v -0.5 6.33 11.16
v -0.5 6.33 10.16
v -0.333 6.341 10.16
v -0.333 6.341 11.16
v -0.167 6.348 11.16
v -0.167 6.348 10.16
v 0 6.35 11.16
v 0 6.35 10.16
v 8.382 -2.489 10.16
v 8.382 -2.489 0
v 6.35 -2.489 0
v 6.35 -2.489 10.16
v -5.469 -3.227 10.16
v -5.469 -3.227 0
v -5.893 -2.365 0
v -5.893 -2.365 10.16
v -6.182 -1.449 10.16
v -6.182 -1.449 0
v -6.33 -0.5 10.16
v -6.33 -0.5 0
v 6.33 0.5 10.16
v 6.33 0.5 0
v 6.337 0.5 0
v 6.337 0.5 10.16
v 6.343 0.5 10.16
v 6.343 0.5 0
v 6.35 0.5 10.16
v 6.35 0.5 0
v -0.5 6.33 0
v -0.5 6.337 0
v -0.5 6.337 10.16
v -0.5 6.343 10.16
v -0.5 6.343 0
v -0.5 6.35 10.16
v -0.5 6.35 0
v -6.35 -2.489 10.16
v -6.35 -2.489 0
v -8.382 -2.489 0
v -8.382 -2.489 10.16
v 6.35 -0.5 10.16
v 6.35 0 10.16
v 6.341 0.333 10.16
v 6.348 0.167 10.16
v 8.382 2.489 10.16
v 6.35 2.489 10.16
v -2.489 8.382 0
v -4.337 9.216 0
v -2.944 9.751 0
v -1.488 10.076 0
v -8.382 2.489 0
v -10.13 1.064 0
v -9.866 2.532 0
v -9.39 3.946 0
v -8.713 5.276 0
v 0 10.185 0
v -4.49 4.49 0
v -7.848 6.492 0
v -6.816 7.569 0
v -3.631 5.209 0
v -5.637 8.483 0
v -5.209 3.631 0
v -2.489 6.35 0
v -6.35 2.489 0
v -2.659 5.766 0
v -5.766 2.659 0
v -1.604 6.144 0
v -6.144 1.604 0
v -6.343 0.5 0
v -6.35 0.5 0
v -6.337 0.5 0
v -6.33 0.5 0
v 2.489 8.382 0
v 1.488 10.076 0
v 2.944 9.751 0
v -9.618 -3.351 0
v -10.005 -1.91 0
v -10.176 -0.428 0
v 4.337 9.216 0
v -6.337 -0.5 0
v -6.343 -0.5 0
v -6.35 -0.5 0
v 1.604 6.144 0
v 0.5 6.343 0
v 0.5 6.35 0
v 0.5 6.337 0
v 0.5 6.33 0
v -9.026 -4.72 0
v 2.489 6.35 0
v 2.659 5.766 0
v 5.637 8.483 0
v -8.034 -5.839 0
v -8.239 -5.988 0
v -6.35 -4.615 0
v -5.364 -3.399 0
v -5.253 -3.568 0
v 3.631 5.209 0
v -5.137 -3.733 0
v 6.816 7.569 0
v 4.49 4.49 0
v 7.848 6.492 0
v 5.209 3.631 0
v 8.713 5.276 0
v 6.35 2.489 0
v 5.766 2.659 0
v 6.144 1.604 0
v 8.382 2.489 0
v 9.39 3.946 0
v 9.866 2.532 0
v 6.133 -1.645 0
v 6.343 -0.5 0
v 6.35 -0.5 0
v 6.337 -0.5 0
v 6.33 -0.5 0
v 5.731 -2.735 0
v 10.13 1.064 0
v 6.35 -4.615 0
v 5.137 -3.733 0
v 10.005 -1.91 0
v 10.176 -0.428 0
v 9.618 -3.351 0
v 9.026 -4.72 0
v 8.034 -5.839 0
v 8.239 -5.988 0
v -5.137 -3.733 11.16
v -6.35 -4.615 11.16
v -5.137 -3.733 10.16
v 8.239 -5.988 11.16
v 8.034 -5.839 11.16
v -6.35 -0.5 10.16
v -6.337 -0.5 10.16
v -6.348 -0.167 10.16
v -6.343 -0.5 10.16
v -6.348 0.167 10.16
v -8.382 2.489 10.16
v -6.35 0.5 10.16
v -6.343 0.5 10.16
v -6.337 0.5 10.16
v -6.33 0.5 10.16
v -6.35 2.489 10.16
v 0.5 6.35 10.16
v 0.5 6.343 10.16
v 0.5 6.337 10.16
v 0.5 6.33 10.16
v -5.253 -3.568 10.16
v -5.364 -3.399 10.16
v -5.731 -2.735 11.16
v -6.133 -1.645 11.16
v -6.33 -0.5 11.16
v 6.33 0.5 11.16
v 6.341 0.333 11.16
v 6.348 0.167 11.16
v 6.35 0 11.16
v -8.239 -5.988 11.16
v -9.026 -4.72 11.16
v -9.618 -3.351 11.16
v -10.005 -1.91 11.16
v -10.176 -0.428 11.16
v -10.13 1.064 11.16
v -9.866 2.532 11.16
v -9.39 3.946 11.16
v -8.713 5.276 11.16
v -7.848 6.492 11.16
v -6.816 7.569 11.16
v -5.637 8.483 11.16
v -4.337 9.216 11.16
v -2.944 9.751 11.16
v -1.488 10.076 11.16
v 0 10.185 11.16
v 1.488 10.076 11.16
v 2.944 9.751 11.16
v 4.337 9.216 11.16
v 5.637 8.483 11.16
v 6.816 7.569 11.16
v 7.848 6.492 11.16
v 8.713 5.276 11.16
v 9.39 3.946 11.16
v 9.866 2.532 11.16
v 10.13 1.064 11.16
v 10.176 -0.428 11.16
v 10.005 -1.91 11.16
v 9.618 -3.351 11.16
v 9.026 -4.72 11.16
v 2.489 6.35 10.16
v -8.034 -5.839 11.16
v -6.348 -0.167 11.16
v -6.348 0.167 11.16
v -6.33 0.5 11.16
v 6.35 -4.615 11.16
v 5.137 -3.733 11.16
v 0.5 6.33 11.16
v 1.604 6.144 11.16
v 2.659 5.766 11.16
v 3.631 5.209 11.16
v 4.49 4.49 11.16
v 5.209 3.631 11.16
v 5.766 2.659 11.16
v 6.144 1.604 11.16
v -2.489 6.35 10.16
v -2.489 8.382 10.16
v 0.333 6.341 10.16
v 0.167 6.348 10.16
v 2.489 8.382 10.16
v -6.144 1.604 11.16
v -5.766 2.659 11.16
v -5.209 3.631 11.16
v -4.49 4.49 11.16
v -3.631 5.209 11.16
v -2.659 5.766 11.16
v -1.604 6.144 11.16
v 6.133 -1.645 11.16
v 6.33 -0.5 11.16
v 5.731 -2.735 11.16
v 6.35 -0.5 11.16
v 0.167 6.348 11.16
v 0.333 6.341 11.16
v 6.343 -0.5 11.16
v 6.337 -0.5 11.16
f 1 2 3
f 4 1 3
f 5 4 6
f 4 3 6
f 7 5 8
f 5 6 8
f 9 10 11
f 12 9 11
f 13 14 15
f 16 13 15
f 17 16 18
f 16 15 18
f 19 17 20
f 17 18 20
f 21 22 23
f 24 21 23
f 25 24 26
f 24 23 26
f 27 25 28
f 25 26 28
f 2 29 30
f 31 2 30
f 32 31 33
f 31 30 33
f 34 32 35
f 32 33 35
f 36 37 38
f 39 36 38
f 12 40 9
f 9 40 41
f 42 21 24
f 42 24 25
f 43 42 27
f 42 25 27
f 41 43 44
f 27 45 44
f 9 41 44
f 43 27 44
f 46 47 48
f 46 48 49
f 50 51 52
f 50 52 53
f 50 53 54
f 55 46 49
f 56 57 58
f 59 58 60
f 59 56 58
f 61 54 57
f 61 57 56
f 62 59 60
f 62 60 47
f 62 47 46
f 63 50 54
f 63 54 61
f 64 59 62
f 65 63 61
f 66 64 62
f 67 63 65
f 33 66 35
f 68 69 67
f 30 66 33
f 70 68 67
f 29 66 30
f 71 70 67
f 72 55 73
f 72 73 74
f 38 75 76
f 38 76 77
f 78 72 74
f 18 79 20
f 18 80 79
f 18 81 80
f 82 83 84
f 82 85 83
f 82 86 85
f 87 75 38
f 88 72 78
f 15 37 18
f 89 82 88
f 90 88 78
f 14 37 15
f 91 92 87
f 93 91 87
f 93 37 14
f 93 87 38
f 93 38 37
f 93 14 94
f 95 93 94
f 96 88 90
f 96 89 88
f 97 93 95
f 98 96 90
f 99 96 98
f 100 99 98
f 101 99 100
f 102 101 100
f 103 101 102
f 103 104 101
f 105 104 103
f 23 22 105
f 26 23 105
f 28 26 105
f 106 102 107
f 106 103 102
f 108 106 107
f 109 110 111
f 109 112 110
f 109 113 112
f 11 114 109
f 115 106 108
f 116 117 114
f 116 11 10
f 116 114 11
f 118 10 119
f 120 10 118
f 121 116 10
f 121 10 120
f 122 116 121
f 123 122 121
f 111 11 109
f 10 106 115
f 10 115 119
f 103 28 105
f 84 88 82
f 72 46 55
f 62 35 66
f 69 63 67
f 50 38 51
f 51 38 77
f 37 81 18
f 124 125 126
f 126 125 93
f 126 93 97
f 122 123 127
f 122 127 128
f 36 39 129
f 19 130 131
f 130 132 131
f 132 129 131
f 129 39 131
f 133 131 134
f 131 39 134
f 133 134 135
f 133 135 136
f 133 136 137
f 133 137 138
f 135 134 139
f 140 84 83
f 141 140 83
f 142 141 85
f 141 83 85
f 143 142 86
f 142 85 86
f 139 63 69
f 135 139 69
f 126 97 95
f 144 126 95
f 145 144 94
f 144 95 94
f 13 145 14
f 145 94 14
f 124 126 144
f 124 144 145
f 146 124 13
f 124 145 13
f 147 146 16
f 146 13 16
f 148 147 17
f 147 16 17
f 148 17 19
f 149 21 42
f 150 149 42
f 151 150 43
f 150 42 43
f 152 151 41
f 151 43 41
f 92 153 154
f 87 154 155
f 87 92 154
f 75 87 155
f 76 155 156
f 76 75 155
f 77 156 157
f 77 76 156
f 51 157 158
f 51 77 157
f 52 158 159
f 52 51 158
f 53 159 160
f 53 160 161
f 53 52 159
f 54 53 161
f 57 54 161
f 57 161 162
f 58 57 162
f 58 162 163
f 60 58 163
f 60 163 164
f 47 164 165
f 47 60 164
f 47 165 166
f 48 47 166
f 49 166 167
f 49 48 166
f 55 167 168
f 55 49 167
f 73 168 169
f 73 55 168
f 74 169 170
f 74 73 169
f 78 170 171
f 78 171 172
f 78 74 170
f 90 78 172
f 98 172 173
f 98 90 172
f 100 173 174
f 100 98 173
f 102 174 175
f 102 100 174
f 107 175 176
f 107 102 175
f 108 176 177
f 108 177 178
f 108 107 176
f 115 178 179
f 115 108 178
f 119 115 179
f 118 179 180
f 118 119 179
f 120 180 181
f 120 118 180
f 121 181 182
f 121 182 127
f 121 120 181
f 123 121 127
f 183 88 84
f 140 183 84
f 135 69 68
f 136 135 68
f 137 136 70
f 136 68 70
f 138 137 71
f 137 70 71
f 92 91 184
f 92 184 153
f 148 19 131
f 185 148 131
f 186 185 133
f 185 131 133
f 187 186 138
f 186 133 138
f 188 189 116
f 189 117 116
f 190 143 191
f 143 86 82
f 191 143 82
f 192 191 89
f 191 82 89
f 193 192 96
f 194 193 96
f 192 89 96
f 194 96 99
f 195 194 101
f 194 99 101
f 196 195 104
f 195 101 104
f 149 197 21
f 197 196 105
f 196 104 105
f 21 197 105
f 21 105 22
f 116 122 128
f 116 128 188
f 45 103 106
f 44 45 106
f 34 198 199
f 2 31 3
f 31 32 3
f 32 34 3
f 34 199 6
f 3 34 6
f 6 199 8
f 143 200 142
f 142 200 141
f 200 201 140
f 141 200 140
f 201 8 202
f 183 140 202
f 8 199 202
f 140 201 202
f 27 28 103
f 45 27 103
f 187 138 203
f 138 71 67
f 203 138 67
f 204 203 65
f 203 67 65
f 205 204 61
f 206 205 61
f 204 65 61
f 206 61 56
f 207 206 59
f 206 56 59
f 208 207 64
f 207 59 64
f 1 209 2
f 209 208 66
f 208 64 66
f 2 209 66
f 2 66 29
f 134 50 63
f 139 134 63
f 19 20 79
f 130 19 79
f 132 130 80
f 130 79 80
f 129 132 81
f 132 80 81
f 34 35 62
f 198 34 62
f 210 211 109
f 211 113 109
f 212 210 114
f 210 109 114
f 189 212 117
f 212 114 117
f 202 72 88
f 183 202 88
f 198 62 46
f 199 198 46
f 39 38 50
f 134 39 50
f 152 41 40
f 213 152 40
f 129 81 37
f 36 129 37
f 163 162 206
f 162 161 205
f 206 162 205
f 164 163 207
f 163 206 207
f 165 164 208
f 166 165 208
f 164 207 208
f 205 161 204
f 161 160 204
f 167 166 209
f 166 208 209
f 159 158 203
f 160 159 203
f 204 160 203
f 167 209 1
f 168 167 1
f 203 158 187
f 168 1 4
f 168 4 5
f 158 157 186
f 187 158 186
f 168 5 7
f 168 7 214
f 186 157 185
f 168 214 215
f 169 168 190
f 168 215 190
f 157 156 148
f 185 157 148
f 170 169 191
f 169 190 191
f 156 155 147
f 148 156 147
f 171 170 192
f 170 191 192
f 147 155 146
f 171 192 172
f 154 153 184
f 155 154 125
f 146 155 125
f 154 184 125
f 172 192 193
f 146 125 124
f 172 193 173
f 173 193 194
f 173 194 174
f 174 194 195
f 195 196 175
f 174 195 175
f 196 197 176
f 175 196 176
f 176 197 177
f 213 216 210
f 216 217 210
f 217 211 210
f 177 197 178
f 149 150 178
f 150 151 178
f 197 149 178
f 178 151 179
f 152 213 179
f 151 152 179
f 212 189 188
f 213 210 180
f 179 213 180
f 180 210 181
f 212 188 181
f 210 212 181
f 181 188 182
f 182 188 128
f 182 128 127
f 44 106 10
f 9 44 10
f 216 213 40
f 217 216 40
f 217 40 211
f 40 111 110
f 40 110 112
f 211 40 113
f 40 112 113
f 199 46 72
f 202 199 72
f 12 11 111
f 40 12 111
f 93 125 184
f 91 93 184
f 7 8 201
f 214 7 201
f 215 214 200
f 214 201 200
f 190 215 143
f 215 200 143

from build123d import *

# Parameters (mm, degrees)
F1_DEPTH = 10.16
F2_R     = 3
F4_DEPTH = 1
F6_DEPTH = 11.16
F8_DEPTH = 11.16


with BuildPart() as f1:
    # F0 (on Top) → F1 (new body)
    with BuildSketch(Plane.XY):
        with BuildLine():
            Line((2.4892, 8.382), (2.4892, 6.35))
            Line((2.4892, 6.35), (0.5, 6.35))
            ThreePointArc((0.5, 6.35), (0.4999030778, 6.340155572), (0.499612349, 6.3303149606))
            ThreePointArc((0.499612349, 6.3303149606), (4.4901280605, 4.4901280605), (6.3303149606, 0.499612349))
            ThreePointArc((6.3303149606, 0.499612349), (6.340155572, 0.4999030778), (6.35, 0.5))
            Line((6.35, 0.5), (6.35, 2.4892))
            Line((6.35, 2.4892), (8.382, 2.4892))
            Line((8.382, 2.4892), (8.382, -2.4892))
            Line((8.382, -2.4892), (6.35, -2.4892))
            Line((6.35, -2.4892), (6.35, -0.5))
            ThreePointArc((6.35, -0.5), (6.340155572, -0.4999030778), (6.3303149606, -0.499612349))
            ThreePointArc((6.3303149606, -0.499612349), (5.9570857831, -2.1990063604), (5.1366242038, -3.733308424))
            Line((5.1366242038, -3.733308424), (6.35, -4.6151923037))
            ThreePointArc((6.35, -4.6151923037), (6.5628814967, -4.3070972197), (6.760827121, -3.9892))
            Line((6.760827121, -3.9892), (9.882, -3.9892))
            Line((9.882, -3.9892), (9.882, 3.9892))
            Line((9.882, 3.9892), (6.760827121, 3.9892))
            ThreePointArc((6.760827121, 3.9892), (5.5507882323, 5.5507882323), (3.9892, 6.760827121))
            Line((3.9892, 6.760827121), (3.9892, 9.882))
            Line((3.9892, 9.882), (-3.9892, 9.882))
            Line((-3.9892, 9.882), (-3.9892, 6.760827121))
            ThreePointArc((-3.9892, 6.760827121), (-5.5507882323, 5.5507882323), (-6.760827121, 3.9892))
            Line((-6.760827121, 3.9892), (-9.882, 3.9892))
            Line((-9.882, 3.9892), (-9.882, -3.9892))
            Line((-9.882, -3.9892), (-6.760827121, -3.9892))
            ThreePointArc((-6.760827121, -3.9892), (-6.5628814967, -4.3070972197), (-6.35, -4.6151923037))
            Line((-6.35, -4.6151923037), (-5.1366242038, -3.733308424))
            ThreePointArc((-5.1366242038, -3.733308424), (-5.3088277076, -3.4840850121), (-5.4689493272, -3.2269324841))
            ThreePointArc((-5.4689493272, -3.2269324841), (-6.0551819306, -1.9123994841), (-6.3303149606, -0.499612349))
            ThreePointArc((-6.3303149606, -0.499612349), (-6.340155572, -0.4999030778), (-6.35, -0.5))
            Line((-6.35, -0.5), (-6.35, -2.4892))
            Line((-6.35, -2.4892), (-8.382, -2.4892))
            Line((-8.382, -2.4892), (-8.382, 2.4892))
            Line((-8.382, 2.4892), (-6.35, 2.4892))
            Line((-6.35, 2.4892), (-6.35, 0.5))
            ThreePointArc((-6.35, 0.5), (-6.340155572, 0.4999030778), (-6.3303149606, 0.499612349))
            ThreePointArc((-6.3303149606, 0.499612349), (-4.4901280605, 4.4901280605), (-0.499612349, 6.3303149606))
            ThreePointArc((-0.499612349, 6.3303149606), (-0.4999030778, 6.340155572), (-0.5, 6.35))
            Line((-0.5, 6.35), (-2.4892, 6.35))
            Line((-2.4892, 6.35), (-2.4892, 8.382))
            Line((-2.4892, 8.382), (2.4892, 8.382))
        make_face()
    extrude(amount=F1_DEPTH)

    # F2
    f2_edges = [f1.edges().sort_by_distance(p)[0] for p in [
        (-3.9892, 9.882, 5.08),
        (3.9892, 9.882, 5.08),
        (-9.882, 3.9892, 5.08),
        (-9.882, -3.9892, 5.08),
        (9.882, 3.9892, 5.08),
        (9.882, -3.9892, 5.08),
    ]]
    fillet(f2_edges, radius=F2_R)

    # F3 (on face) → F4 (join)
    with BuildSketch(Plane.XY.offset(10.16)):
        with BuildLine():
            ThreePointArc((-3.9892, 6.760827121), (-5.5507882323, 5.5507882323), (-6.760827121, 3.9892))
            Line((-6.760827121, 3.9892), (-6.882, 3.9892))
            ThreePointArc((-6.882, 3.9892), (-9.0033203436, 3.1105203436), (-9.882, 0.9892))
            Line((-9.882, 0.9892), (-9.882, -0.9892))
            ThreePointArc((-9.882, -0.9892), (-9.0033203436, -3.1105203436), (-6.882, -3.9892))
            Line((-6.882, -3.9892), (-6.760827121, -3.9892))
            ThreePointArc((-6.760827121, -3.9892), (-6.5628814967, -4.3070972197), (-6.35, -4.6151923037))
            Line((-6.35, -4.6151923037), (-5.1366242038, -3.733308424))
            ThreePointArc((-5.1366242038, -3.733308424), (-5.9570857831, -2.1990063604), (-6.3303149606, -0.499612349))
            ThreePointArc((-6.3303149606, -0.499612349), (-6.340155572, -0.4999030778), (-6.35, -0.5))
            Line((-6.35, -0.5), (-6.35, -2.4892))
            Line((-6.35, -2.4892), (-8.382, -2.4892))
            Line((-8.382, -2.4892), (-8.382, 2.4892))
            Line((-8.382, 2.4892), (-6.35, 2.4892))
            Line((-6.35, 2.4892), (-6.35, 0.5))
            ThreePointArc((-6.35, 0.5), (-6.340155572, 0.4999030778), (-6.3303149606, 0.499612349))
            ThreePointArc((-6.3303149606, 0.499612349), (-4.4901280605, 4.4901280605), (-0.499612349, 6.3303149606))
            ThreePointArc((-0.499612349, 6.3303149606), (-0.4999030778, 6.340155572), (-0.5, 6.35))
            Line((-0.5, 6.35), (-2.4892, 6.35))
            Line((-2.4892, 6.35), (-2.4892, 8.382))
            Line((-2.4892, 8.382), (2.4892, 8.382))
            Line((2.4892, 8.382), (2.4892, 6.35))
            Line((2.4892, 6.35), (0.5, 6.35))
            ThreePointArc((0.5, 6.35), (0.4999030778, 6.340155572), (0.499612349, 6.3303149606))
            ThreePointArc((0.499612349, 6.3303149606), (4.4901280605, 4.4901280605), (6.3303149606, 0.499612349))
            ThreePointArc((6.3303149606, 0.499612349), (6.340155572, 0.4999030778), (6.35, 0.5))
            Line((6.35, 0.5), (6.35, 2.4892))
            Line((6.35, 2.4892), (8.382, 2.4892))
            Line((8.382, 2.4892), (8.382, -2.4892))
            Line((8.382, -2.4892), (6.35, -2.4892))
            Line((6.35, -2.4892), (6.35, -0.5))
            ThreePointArc((6.35, -0.5), (6.340155572, -0.4999030778), (6.3303149606, -0.499612349))
            ThreePointArc((6.3303149606, -0.499612349), (5.9570857831, -2.1990063604), (5.1366242038, -3.733308424))
            Line((5.1366242038, -3.733308424), (6.35, -4.6151923037))
            ThreePointArc((6.35, -4.6151923037), (6.5628814967, -4.3070972197), (6.760827121, -3.9892))
            Line((6.760827121, -3.9892), (6.882, -3.9892))
            ThreePointArc((6.882, -3.9892), (9.0033203436, -3.1105203436), (9.882, -0.9892))
            Line((9.882, -0.9892), (9.882, 0.9892))
            ThreePointArc((9.882, 0.9892), (9.0033203436, 3.1105203436), (6.882, 3.9892))
            Line((6.882, 3.9892), (6.760827121, 3.9892))
            ThreePointArc((6.760827121, 3.9892), (5.5507882323, 5.5507882323), (3.9892, 6.760827121))
            Line((3.9892, 6.760827121), (3.9892, 6.882))
            ThreePointArc((3.9892, 6.882), (3.1105203436, 9.0033203436), (0.9892, 9.882))
            Line((0.9892, 9.882), (-0.9892, 9.882))
            ThreePointArc((-0.9892, 9.882), (-3.1105203436, 9.0033203436), (-3.9892, 6.882))
            Line((-3.9892, 6.882), (-3.9892, 6.760827121))
        make_face()
        with BuildLine():
            ThreePointArc((-6.35, -0.5), (-6.340155572, -0.4999030778), (-6.3303149606, -0.499612349))
            ThreePointArc((-6.3303149606, -0.499612349), (-6.35, 0), (-6.3303149606, 0.499612349))
            ThreePointArc((-6.3303149606, 0.499612349), (-6.340155572, 0.4999030778), (-6.35, 0.5))
            Line((-6.35, 0.5), (-6.35, 2.4892))
            Line((-6.35, 2.4892), (-8.382, 2.4892))
            Line((-8.382, 2.4892), (-8.382, -2.4892))
            Line((-8.382, -2.4892), (-6.35, -2.4892))
            Line((-6.35, -2.4892), (-6.35, -0.5))
        make_face()
        with BuildLine():
            ThreePointArc((-0.5, 6.35), (-0.4999030778, 6.340155572), (-0.499612349, 6.3303149606))
            ThreePointArc((-0.499612349, 6.3303149606), (-0.25, 6.3450768317), (0, 6.35))
            ThreePointArc((0, 6.35), (0.25, 6.3450768317), (0.499612349, 6.3303149606))
            ThreePointArc((0.499612349, 6.3303149606), (0.4999030778, 6.340155572), (0.5, 6.35))
            Line((0.5, 6.35), (2.4892, 6.35))
            Line((2.4892, 6.35), (2.4892, 8.382))
            Line((2.4892, 8.382), (-2.4892, 8.382))
            Line((-2.4892, 8.382), (-2.4892, 6.35))
            Line((-2.4892, 6.35), (-0.5, 6.35))
        make_face()
        with BuildLine():
            ThreePointArc((6.35, 0.5), (6.340155572, 0.4999030778), (6.3303149606, 0.499612349))
            ThreePointArc((6.3303149606, 0.499612349), (6.3450768317, 0.25), (6.35, 0))
            Line((6.35, 0), (6.35, -0.5))
            Line((6.35, -0.5), (6.35, -2.4892))
            Line((6.35, -2.4892), (8.382, -2.4892))
            Line((8.382, -2.4892), (8.382, 2.4892))
            Line((8.382, 2.4892), (6.35, 2.4892))
            Line((6.35, 2.4892), (6.35, 0.5))
        make_face()
    extrude(amount=F4_DEPTH)

    # F5 (on face) → F6 (join, through all)
    with BuildSketch(Plane(origin=(0, 0, 0), x_dir=(1, 0, 0), z_dir=(0, 0, -1))):
        with BuildLine():
            ThreePointArc((3.9892, -6.882), (3.3907514875, -8.6799294905), (1.8341663648, -9.7605468282))
            ThreePointArc((1.8341663648, -9.7605468282), (7.0225508414, -7.0225508414), (9.7605468282, -1.8341663648))
            ThreePointArc((9.7605468282, -1.8341663648), (8.6799294905, -3.3907514875), (6.882, -3.9892))
            Line((6.882, -3.9892), (6.760827121, -3.9892))
            ThreePointArc((6.760827121, -3.9892), (5.5507882323, -5.5507882323), (3.9892, -6.760827121))
            Line((3.9892, -6.760827121), (3.9892, -6.882))
        make_face()
        with BuildLine():
            ThreePointArc((6.882, 3.9892), (8.6799294905, 3.3907514875), (9.7605468282, 1.8341663648))
            ThreePointArc((9.7605468282, 1.8341663648), (9.1196479712, 3.9324879556), (8.0336694496, 5.8388865219))
            Line((8.0336694496, 5.8388865219), (6.35, 4.6151923037))
            ThreePointArc((6.35, 4.6151923037), (6.5628814967, 4.3070972197), (6.760827121, 3.9892))
            Line((6.760827121, 3.9892), (6.882, 3.9892))
        make_face()
        with BuildLine():
            ThreePointArc((-8.0336694496, 5.8388865219), (-9.1196479712, 3.9324879556), (-9.7605468282, 1.8341663648))
            ThreePointArc((-9.7605468282, 1.8341663648), (-8.6799294905, 3.3907514875), (-6.882, 3.9892))
            Line((-6.882, 3.9892), (-6.760827121, 3.9892))
            ThreePointArc((-6.760827121, 3.9892), (-6.5628814967, 4.3070972197), (-6.35, 4.6151923037))
            Line((-6.35, 4.6151923037), (-8.0336694496, 5.8388865219))
        make_face()
        with BuildLine():
            Line((-3.9892, -6.882), (-3.9892, -6.760827121))
            ThreePointArc((-3.9892, -6.760827121), (-5.5507882323, -5.5507882323), (-6.760827121, -3.9892))
            Line((-6.760827121, -3.9892), (-6.882, -3.9892))
            ThreePointArc((-6.882, -3.9892), (-8.6799294905, -3.3907514875), (-9.7605468282, -1.8341663648))
            ThreePointArc((-9.7605468282, -1.8341663648), (-7.0225508414, -7.0225508414), (-1.8341663648, -9.7605468282))
            ThreePointArc((-1.8341663648, -9.7605468282), (-3.3907514875, -8.6799294905), (-3.9892, -6.882))
        make_face()
    extrude(amount=-F6_DEPTH)

    # F7 (on face) → F8 (join, through all)
    with BuildSketch(Plane(origin=(0, 0, 0), x_dir=(1, 0, 0), z_dir=(0, 0, -1))):
        with BuildLine():
            Line((-7.8282044814, 5.6895541849), (-8.2391344177, 5.9882188588))
            ThreePointArc((-8.2391344177, 5.9882188588), (0, -10.1853866424), (8.2391344177, 5.9882188588))
            Line((8.2391344177, 5.9882188588), (7.8282044814, 5.6895541849))
            ThreePointArc((7.8282044814, 5.6895541849), (0, -9.6773866424), (-7.8282044814, 5.6895541849))
        make_face()
    extrude(amount=-F8_DEPTH)


solid = f1.part
